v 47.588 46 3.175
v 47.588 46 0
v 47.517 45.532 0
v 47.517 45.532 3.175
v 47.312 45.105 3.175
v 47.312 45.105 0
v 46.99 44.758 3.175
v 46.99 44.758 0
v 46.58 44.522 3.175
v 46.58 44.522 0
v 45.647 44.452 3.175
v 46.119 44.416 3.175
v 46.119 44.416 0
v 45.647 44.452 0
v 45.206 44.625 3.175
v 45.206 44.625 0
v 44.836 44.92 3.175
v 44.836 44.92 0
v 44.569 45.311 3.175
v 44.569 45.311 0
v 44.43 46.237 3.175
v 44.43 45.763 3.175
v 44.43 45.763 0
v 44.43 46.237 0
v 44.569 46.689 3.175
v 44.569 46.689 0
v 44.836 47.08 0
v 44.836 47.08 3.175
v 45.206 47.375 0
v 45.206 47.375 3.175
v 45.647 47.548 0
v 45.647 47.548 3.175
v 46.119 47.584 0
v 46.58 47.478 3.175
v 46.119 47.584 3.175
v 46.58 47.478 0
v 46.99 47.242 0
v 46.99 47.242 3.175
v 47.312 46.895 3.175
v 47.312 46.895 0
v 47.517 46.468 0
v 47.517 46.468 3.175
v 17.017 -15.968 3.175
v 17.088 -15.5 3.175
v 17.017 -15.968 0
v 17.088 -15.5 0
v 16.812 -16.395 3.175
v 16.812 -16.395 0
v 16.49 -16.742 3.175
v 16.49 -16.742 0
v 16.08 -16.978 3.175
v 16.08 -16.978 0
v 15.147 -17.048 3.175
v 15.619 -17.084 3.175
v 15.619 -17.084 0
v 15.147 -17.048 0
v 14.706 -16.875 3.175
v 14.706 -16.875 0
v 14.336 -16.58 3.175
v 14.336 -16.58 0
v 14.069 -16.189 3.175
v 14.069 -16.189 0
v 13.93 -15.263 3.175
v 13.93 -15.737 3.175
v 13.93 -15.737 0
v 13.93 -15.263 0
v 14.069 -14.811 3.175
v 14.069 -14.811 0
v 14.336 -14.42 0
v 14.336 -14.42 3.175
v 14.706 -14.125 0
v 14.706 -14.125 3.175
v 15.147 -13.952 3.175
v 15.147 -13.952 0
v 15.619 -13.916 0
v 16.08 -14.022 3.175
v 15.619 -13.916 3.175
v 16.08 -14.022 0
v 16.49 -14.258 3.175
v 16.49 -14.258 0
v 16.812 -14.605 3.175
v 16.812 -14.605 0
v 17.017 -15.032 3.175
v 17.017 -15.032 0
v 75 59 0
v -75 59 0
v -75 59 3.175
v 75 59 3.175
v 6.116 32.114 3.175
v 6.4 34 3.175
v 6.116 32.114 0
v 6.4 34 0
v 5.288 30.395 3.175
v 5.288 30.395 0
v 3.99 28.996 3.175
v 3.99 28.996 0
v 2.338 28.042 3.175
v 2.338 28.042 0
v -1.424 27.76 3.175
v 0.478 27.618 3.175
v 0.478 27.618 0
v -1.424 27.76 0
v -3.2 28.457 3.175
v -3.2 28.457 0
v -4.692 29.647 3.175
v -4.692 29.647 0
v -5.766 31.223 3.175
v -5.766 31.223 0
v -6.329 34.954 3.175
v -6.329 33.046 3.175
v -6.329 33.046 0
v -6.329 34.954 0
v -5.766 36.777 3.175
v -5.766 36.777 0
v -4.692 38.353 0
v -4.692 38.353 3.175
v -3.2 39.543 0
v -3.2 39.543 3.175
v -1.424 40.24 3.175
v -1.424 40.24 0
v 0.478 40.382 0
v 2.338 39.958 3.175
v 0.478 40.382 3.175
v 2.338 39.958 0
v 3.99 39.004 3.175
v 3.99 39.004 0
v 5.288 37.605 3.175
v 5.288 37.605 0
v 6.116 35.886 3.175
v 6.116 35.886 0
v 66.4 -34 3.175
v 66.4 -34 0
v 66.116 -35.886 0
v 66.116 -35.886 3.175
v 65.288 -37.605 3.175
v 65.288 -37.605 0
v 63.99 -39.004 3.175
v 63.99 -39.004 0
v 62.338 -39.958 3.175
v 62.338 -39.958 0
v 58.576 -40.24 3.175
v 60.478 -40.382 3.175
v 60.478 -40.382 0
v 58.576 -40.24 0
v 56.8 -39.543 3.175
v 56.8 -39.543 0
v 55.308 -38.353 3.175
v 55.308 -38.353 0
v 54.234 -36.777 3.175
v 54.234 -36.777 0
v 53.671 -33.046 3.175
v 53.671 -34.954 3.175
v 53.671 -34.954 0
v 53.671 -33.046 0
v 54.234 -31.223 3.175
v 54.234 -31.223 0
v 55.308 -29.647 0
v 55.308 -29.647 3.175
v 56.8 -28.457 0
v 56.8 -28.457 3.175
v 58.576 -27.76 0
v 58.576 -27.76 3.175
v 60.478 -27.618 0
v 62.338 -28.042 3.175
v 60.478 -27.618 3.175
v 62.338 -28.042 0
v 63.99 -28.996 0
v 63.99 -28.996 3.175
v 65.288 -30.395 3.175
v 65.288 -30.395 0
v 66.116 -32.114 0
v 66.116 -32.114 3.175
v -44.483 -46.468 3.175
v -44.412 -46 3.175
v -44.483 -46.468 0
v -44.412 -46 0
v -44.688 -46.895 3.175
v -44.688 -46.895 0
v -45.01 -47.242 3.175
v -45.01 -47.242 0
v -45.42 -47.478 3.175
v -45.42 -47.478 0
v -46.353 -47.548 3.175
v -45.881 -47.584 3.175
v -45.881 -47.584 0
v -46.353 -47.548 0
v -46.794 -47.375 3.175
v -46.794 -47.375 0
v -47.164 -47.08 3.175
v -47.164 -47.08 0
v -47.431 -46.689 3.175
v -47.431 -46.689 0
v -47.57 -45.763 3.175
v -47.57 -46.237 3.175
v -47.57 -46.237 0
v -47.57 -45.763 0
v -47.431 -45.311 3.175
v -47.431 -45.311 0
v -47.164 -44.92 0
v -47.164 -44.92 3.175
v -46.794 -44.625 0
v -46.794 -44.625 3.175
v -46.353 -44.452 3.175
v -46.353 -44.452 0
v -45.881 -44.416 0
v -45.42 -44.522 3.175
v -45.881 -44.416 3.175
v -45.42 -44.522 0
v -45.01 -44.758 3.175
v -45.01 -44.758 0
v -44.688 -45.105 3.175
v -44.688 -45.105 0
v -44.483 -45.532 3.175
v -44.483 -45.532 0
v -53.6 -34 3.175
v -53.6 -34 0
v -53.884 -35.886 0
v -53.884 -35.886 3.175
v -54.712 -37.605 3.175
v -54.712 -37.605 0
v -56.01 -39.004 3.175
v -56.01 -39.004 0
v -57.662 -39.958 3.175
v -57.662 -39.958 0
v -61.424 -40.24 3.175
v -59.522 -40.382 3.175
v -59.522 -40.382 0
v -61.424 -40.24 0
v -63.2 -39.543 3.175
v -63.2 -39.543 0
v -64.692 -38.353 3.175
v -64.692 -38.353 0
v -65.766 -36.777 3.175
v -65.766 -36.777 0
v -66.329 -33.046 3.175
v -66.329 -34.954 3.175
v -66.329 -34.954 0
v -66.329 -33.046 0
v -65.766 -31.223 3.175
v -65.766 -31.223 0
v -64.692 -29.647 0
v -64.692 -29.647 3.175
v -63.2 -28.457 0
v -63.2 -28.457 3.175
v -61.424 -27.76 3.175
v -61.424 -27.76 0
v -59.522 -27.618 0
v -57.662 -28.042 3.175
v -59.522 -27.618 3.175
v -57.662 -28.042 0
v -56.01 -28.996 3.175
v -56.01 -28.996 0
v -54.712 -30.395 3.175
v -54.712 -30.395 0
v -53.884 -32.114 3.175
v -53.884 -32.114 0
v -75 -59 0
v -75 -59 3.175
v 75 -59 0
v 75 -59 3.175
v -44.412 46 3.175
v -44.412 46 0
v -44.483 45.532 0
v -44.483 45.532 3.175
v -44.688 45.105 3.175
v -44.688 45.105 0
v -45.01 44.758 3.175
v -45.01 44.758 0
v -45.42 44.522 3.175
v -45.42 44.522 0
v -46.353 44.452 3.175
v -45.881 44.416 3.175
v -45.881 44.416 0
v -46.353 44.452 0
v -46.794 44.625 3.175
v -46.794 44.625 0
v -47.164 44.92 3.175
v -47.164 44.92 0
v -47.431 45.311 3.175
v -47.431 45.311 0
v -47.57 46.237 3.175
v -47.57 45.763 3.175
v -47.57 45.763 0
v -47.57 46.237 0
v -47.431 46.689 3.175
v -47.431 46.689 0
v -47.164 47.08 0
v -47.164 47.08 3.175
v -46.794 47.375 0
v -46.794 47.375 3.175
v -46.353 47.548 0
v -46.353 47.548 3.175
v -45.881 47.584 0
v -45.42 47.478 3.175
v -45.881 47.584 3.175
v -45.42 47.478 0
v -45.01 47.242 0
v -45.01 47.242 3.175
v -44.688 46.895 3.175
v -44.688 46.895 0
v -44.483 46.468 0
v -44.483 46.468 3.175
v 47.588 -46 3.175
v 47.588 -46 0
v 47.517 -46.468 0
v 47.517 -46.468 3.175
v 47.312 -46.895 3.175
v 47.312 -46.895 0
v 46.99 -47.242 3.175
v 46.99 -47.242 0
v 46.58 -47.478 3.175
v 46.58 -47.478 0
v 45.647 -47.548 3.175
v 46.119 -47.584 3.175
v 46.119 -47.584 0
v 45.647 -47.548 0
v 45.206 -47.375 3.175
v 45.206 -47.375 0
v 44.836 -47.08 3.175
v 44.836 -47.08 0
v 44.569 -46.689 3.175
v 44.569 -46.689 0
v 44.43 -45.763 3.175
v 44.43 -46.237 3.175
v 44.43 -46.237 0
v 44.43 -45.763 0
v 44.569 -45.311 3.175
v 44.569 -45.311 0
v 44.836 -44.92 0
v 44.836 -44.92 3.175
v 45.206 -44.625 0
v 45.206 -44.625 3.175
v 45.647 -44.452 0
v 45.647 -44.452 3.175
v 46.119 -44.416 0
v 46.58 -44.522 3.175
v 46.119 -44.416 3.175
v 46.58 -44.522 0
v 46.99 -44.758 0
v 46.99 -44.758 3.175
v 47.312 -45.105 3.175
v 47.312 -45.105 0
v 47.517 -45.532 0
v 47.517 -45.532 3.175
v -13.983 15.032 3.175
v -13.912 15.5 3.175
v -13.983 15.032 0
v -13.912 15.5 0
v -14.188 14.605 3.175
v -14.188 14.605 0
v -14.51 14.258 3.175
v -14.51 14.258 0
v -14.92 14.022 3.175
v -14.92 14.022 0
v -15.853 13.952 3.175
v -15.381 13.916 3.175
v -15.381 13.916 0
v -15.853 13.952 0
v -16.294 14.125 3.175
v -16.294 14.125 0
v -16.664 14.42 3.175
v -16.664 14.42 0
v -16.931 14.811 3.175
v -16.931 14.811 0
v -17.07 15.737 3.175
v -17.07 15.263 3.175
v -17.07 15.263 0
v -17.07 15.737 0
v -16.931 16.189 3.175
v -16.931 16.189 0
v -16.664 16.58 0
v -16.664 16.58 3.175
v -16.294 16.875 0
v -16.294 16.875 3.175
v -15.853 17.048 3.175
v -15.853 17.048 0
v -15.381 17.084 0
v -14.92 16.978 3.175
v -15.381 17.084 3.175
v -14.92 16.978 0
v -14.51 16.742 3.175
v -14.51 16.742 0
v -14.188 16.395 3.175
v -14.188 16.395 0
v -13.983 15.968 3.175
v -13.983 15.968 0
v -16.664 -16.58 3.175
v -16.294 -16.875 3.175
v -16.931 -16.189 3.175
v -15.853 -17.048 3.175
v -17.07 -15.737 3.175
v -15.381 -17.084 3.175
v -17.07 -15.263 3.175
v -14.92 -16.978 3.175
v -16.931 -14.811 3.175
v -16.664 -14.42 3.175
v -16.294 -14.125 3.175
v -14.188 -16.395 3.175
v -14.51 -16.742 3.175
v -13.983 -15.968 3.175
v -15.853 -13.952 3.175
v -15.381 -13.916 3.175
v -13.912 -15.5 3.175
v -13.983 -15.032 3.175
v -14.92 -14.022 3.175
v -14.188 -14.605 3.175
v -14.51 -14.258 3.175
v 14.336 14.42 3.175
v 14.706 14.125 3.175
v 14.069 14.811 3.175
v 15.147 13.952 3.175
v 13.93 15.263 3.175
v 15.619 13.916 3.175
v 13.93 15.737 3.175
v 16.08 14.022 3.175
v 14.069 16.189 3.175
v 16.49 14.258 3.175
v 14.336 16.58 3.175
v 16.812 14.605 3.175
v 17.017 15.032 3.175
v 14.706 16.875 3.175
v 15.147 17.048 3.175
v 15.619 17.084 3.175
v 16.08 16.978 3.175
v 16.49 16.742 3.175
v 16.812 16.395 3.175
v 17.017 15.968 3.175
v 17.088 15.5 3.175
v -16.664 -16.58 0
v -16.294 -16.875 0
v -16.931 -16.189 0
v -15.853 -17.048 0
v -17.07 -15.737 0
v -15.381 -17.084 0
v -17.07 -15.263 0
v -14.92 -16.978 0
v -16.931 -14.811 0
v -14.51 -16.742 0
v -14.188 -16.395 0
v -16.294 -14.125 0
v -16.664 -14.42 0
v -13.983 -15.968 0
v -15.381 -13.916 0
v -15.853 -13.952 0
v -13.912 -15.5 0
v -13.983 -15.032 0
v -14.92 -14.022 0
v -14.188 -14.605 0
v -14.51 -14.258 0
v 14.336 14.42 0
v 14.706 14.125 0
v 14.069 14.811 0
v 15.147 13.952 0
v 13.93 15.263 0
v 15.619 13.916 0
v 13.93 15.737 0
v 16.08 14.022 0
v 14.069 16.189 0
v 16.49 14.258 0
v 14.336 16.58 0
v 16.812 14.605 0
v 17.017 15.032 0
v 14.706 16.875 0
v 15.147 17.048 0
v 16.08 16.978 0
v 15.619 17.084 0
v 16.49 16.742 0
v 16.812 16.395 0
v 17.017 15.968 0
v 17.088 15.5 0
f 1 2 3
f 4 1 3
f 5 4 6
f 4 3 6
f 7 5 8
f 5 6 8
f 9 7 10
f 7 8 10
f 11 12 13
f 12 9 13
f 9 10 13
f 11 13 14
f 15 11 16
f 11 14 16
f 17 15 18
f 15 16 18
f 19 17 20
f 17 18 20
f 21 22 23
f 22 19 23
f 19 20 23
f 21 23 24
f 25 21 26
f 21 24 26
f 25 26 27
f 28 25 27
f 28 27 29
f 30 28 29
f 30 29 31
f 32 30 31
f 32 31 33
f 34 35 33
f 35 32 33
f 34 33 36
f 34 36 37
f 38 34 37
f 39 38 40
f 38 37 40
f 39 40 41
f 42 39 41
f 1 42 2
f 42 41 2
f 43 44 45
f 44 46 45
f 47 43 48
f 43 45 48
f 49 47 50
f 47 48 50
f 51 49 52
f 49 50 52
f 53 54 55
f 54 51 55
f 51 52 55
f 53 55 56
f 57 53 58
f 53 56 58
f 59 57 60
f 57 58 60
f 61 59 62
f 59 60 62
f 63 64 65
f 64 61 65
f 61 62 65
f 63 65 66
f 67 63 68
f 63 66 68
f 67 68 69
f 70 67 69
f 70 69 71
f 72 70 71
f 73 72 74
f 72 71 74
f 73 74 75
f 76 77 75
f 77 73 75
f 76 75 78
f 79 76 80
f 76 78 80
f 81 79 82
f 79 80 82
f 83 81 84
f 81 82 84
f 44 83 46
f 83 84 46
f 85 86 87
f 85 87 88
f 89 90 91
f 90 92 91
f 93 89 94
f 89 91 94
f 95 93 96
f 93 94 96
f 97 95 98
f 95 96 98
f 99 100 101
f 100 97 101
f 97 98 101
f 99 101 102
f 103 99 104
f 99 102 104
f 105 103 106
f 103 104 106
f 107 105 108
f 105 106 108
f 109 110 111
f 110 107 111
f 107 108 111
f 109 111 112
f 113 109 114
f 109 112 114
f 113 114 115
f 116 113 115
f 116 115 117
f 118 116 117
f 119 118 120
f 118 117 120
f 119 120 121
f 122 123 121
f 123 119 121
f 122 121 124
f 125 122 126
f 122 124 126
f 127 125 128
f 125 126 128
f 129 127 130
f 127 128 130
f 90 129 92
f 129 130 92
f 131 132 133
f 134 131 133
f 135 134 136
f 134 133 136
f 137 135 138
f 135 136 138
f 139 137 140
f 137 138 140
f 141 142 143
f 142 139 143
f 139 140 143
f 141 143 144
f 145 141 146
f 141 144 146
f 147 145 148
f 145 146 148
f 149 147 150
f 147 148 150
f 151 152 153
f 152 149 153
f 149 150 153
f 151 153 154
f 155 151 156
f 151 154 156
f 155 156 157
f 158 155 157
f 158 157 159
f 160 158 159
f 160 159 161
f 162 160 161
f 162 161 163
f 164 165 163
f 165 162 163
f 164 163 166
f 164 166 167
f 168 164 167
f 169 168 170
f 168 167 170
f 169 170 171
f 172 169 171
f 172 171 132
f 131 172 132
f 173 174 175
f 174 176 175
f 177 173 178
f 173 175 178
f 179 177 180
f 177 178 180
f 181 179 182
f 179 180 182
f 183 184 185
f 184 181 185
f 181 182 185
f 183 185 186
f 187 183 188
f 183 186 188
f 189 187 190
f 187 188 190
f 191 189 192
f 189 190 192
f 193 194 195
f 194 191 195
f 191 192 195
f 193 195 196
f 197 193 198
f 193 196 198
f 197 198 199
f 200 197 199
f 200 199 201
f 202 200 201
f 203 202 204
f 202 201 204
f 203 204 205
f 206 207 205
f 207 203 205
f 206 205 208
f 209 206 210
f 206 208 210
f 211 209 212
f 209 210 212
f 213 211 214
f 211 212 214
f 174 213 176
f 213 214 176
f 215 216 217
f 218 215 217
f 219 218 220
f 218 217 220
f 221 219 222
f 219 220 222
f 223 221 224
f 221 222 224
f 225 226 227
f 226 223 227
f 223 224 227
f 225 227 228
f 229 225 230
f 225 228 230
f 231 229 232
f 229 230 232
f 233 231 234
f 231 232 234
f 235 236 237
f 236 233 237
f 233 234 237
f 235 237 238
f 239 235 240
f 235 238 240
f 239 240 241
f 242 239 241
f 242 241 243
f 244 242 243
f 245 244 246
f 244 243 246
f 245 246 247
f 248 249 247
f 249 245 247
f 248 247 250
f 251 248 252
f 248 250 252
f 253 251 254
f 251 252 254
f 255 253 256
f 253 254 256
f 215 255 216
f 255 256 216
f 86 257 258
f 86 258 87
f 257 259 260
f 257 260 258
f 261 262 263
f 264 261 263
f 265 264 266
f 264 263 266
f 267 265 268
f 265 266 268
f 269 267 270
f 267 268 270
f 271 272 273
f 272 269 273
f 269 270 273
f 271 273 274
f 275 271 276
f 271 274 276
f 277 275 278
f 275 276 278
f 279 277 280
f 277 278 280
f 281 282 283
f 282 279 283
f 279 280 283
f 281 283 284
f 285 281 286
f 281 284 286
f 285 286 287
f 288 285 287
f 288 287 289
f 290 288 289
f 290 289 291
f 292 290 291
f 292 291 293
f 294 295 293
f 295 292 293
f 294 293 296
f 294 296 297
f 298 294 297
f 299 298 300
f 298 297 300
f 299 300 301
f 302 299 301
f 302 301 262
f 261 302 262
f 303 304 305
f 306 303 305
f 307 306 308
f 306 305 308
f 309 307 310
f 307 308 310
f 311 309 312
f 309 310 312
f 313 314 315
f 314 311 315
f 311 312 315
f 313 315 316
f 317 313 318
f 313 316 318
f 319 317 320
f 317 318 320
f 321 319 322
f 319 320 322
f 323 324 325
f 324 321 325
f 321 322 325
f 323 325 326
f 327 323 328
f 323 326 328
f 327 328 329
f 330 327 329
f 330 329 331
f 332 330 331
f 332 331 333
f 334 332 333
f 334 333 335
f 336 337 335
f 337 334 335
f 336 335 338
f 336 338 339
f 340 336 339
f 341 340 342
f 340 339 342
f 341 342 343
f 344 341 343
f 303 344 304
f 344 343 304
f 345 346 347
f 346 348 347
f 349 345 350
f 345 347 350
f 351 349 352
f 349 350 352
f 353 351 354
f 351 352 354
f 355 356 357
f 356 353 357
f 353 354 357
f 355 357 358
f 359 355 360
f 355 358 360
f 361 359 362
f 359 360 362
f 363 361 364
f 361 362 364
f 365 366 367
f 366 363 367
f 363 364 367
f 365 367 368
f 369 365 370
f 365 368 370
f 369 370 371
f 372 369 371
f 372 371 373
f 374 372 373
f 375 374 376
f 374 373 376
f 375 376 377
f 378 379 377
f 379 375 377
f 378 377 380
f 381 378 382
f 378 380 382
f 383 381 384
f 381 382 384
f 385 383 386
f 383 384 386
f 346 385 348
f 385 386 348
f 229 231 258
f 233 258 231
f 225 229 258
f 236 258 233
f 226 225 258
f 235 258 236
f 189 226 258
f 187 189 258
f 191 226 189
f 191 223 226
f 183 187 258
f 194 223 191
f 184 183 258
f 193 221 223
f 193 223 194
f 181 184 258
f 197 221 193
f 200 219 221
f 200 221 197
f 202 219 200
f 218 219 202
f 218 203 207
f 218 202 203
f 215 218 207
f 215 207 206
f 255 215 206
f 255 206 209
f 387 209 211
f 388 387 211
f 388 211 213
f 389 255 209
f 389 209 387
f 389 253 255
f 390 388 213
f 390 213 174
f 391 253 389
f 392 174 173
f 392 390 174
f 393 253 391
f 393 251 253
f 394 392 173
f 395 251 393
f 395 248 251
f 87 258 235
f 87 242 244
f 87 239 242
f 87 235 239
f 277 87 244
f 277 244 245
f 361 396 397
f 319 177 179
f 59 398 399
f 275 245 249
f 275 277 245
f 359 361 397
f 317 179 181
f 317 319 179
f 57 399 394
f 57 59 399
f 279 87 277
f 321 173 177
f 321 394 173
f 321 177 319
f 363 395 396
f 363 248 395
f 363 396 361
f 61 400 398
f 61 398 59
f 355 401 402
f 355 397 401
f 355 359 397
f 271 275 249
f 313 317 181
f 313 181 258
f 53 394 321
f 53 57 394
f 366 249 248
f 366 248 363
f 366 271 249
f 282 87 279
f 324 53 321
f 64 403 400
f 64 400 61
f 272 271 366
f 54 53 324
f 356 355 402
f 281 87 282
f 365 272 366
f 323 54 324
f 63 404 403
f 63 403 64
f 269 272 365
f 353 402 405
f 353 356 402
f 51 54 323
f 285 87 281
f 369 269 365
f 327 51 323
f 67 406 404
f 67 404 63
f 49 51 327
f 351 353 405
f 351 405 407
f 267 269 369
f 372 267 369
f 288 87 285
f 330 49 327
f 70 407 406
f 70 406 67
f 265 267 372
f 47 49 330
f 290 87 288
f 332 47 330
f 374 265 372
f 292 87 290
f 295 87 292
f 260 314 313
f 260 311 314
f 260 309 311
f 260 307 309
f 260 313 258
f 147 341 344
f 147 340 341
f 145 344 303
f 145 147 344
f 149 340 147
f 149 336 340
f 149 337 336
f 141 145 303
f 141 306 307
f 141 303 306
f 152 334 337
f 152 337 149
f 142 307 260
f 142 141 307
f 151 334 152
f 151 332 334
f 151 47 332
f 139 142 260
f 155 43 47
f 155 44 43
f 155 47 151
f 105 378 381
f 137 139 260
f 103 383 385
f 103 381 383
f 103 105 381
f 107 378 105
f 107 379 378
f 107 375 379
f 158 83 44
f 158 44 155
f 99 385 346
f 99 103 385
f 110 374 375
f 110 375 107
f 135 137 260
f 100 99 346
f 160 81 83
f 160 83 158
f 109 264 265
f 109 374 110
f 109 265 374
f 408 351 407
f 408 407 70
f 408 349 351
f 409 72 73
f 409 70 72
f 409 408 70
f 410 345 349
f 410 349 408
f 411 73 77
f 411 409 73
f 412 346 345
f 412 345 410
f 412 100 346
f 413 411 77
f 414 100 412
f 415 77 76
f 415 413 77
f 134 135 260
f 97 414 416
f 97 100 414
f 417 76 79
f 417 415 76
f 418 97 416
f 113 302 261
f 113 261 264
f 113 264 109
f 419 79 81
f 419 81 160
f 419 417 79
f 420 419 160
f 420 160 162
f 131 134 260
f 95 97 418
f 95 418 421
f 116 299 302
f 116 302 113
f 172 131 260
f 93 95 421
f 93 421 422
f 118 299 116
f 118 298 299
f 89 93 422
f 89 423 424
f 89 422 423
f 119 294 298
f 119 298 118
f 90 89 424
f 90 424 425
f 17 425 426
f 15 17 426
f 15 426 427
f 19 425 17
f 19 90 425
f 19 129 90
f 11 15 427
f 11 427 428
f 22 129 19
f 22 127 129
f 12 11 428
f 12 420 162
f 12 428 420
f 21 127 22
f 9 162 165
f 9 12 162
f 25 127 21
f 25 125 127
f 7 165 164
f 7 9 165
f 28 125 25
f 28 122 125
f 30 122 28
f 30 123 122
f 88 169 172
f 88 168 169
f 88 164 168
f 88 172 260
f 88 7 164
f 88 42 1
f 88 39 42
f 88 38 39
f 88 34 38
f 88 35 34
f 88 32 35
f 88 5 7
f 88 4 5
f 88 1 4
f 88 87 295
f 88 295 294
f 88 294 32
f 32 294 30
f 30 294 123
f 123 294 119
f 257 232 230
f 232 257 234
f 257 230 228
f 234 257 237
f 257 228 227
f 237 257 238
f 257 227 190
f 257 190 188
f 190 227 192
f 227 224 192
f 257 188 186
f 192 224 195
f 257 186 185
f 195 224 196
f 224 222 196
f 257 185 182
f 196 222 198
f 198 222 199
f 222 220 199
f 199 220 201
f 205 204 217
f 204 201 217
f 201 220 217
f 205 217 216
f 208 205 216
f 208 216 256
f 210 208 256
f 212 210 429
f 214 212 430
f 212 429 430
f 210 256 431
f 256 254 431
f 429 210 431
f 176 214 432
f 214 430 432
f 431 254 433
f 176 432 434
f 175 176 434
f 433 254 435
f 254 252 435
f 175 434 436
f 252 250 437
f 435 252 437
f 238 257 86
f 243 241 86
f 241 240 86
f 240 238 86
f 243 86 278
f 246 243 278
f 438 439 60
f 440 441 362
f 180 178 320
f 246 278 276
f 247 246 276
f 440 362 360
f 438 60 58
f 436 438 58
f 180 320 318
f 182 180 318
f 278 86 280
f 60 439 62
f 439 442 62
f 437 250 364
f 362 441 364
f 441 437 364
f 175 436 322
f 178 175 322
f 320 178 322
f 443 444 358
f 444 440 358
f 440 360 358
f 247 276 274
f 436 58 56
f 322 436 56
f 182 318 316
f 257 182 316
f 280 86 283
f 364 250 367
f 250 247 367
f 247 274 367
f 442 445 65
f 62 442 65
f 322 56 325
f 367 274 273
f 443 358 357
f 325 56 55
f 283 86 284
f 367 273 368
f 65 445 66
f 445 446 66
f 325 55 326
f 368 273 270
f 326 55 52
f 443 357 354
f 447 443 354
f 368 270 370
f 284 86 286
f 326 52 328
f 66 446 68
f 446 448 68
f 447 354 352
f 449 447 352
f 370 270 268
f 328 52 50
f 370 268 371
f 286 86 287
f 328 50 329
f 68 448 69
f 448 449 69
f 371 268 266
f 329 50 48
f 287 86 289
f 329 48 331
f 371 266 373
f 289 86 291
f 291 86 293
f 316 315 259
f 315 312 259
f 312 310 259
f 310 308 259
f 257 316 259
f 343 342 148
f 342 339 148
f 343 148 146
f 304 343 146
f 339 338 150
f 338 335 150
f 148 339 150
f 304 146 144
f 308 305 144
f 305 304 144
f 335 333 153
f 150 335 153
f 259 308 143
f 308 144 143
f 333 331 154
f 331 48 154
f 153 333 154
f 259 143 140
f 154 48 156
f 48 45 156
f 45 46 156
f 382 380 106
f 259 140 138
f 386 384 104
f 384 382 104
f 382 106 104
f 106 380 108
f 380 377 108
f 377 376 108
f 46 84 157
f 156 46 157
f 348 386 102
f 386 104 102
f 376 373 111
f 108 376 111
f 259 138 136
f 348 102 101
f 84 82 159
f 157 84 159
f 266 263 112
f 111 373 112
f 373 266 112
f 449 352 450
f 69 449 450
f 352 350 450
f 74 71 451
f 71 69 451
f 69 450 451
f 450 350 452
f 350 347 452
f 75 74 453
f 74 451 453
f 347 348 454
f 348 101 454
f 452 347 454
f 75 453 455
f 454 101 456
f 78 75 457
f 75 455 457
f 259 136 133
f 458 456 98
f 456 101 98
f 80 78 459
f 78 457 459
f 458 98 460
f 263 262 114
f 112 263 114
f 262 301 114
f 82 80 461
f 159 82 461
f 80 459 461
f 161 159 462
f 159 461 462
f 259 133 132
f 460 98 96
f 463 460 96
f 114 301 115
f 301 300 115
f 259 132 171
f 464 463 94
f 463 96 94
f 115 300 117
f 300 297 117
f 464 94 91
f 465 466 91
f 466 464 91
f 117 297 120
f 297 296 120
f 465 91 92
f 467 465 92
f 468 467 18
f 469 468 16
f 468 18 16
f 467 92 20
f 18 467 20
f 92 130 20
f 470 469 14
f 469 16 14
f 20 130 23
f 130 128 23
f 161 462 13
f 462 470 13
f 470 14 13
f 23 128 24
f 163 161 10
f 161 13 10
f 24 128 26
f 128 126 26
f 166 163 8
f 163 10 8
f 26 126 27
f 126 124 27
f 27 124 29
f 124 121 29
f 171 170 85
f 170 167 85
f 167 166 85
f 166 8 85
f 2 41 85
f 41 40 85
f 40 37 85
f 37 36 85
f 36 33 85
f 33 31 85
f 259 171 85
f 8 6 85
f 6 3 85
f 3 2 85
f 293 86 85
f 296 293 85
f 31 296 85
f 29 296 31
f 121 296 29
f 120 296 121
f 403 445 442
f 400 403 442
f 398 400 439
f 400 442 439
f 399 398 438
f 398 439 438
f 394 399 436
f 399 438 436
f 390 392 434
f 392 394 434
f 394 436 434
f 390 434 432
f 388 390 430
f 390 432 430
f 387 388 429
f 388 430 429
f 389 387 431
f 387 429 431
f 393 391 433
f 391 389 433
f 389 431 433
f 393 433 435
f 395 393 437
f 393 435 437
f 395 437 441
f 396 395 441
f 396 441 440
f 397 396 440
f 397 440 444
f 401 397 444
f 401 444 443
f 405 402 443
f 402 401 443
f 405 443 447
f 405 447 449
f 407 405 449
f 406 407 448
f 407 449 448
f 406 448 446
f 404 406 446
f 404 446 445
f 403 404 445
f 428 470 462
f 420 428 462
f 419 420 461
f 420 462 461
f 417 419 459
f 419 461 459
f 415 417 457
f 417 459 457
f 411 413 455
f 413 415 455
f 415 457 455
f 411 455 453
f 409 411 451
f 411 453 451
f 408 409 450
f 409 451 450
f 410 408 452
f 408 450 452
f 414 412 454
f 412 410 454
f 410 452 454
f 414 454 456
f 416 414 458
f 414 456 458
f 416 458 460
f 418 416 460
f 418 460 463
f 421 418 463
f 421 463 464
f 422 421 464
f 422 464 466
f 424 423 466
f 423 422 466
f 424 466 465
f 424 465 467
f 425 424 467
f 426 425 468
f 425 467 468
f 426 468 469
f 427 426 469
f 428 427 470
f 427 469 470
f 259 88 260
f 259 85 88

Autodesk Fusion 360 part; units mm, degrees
sketch "movingPlatform" plane through (0, 0, 0) normal (0, 0, 1) x (1, 0, 0)
  line L0 (-75, 59) -> (75, 59)
  line L1 (75, 59) -> (75, -59)
  line L2 (75, -59) -> (-75, -59)
  line L3 (-75, -59) -> (-75, 59)
  line L4 (-75, 59) -> (75, -59) construction
  line L5 (75, 59) -> (-75, -59) construction
  circle A0 centre (-60, -34) radius 6.4
  line L6 (0, 2.5) -> (0, 20)
  circle A1 centre (60, -34) radius 6.4
  circle A2 centre (0, 34) radius 6.4
  circle A3 centre (-46, -46) radius 1.588
  circle A4 centre (-15.5, -15.5) radius 1.588
  circle A5 centre (0, 0) radius 57 construction
  circle A6 centre (15.5, -15.5) radius 1.588
  circle A7 centre (15.5, 15.5) radius 1.588
  circle A8 centre (46, -46) radius 1.588
  circle A9 centre (-46, 46) radius 1.588
  circle A10 centre (46, 46) radius 1.588
  circle A11 centre (-15.5, 15.5) radius 1.588
  dimension "d1" = 150
  dimension "d2" = 118
  dimension "d3" = 12.8
  dimension "d4" = 120
  dimension "d5" = 12.8
  dimension "d6" = 68
  dimension "d7" = 25
  dimension "d8" = 25
  dimension "d9" = 3.176
  dimension "d12" = 92
  dimension "d13" = 92
  dimension "d21" = 3.176
  dimension "d24" = 31
  dimension "d25" = 31
  dimension "d27" = 15.5
  dimension "d31" = 114
  dimension "d34" = 46
  dimension "d37" = 46
  dimension "d49" = 15.5
extrude "Extrude3" add sketch "movingPlatform" along normal blind 3.175
equation "d4 = 132.800 mm - 12.8 mm"
